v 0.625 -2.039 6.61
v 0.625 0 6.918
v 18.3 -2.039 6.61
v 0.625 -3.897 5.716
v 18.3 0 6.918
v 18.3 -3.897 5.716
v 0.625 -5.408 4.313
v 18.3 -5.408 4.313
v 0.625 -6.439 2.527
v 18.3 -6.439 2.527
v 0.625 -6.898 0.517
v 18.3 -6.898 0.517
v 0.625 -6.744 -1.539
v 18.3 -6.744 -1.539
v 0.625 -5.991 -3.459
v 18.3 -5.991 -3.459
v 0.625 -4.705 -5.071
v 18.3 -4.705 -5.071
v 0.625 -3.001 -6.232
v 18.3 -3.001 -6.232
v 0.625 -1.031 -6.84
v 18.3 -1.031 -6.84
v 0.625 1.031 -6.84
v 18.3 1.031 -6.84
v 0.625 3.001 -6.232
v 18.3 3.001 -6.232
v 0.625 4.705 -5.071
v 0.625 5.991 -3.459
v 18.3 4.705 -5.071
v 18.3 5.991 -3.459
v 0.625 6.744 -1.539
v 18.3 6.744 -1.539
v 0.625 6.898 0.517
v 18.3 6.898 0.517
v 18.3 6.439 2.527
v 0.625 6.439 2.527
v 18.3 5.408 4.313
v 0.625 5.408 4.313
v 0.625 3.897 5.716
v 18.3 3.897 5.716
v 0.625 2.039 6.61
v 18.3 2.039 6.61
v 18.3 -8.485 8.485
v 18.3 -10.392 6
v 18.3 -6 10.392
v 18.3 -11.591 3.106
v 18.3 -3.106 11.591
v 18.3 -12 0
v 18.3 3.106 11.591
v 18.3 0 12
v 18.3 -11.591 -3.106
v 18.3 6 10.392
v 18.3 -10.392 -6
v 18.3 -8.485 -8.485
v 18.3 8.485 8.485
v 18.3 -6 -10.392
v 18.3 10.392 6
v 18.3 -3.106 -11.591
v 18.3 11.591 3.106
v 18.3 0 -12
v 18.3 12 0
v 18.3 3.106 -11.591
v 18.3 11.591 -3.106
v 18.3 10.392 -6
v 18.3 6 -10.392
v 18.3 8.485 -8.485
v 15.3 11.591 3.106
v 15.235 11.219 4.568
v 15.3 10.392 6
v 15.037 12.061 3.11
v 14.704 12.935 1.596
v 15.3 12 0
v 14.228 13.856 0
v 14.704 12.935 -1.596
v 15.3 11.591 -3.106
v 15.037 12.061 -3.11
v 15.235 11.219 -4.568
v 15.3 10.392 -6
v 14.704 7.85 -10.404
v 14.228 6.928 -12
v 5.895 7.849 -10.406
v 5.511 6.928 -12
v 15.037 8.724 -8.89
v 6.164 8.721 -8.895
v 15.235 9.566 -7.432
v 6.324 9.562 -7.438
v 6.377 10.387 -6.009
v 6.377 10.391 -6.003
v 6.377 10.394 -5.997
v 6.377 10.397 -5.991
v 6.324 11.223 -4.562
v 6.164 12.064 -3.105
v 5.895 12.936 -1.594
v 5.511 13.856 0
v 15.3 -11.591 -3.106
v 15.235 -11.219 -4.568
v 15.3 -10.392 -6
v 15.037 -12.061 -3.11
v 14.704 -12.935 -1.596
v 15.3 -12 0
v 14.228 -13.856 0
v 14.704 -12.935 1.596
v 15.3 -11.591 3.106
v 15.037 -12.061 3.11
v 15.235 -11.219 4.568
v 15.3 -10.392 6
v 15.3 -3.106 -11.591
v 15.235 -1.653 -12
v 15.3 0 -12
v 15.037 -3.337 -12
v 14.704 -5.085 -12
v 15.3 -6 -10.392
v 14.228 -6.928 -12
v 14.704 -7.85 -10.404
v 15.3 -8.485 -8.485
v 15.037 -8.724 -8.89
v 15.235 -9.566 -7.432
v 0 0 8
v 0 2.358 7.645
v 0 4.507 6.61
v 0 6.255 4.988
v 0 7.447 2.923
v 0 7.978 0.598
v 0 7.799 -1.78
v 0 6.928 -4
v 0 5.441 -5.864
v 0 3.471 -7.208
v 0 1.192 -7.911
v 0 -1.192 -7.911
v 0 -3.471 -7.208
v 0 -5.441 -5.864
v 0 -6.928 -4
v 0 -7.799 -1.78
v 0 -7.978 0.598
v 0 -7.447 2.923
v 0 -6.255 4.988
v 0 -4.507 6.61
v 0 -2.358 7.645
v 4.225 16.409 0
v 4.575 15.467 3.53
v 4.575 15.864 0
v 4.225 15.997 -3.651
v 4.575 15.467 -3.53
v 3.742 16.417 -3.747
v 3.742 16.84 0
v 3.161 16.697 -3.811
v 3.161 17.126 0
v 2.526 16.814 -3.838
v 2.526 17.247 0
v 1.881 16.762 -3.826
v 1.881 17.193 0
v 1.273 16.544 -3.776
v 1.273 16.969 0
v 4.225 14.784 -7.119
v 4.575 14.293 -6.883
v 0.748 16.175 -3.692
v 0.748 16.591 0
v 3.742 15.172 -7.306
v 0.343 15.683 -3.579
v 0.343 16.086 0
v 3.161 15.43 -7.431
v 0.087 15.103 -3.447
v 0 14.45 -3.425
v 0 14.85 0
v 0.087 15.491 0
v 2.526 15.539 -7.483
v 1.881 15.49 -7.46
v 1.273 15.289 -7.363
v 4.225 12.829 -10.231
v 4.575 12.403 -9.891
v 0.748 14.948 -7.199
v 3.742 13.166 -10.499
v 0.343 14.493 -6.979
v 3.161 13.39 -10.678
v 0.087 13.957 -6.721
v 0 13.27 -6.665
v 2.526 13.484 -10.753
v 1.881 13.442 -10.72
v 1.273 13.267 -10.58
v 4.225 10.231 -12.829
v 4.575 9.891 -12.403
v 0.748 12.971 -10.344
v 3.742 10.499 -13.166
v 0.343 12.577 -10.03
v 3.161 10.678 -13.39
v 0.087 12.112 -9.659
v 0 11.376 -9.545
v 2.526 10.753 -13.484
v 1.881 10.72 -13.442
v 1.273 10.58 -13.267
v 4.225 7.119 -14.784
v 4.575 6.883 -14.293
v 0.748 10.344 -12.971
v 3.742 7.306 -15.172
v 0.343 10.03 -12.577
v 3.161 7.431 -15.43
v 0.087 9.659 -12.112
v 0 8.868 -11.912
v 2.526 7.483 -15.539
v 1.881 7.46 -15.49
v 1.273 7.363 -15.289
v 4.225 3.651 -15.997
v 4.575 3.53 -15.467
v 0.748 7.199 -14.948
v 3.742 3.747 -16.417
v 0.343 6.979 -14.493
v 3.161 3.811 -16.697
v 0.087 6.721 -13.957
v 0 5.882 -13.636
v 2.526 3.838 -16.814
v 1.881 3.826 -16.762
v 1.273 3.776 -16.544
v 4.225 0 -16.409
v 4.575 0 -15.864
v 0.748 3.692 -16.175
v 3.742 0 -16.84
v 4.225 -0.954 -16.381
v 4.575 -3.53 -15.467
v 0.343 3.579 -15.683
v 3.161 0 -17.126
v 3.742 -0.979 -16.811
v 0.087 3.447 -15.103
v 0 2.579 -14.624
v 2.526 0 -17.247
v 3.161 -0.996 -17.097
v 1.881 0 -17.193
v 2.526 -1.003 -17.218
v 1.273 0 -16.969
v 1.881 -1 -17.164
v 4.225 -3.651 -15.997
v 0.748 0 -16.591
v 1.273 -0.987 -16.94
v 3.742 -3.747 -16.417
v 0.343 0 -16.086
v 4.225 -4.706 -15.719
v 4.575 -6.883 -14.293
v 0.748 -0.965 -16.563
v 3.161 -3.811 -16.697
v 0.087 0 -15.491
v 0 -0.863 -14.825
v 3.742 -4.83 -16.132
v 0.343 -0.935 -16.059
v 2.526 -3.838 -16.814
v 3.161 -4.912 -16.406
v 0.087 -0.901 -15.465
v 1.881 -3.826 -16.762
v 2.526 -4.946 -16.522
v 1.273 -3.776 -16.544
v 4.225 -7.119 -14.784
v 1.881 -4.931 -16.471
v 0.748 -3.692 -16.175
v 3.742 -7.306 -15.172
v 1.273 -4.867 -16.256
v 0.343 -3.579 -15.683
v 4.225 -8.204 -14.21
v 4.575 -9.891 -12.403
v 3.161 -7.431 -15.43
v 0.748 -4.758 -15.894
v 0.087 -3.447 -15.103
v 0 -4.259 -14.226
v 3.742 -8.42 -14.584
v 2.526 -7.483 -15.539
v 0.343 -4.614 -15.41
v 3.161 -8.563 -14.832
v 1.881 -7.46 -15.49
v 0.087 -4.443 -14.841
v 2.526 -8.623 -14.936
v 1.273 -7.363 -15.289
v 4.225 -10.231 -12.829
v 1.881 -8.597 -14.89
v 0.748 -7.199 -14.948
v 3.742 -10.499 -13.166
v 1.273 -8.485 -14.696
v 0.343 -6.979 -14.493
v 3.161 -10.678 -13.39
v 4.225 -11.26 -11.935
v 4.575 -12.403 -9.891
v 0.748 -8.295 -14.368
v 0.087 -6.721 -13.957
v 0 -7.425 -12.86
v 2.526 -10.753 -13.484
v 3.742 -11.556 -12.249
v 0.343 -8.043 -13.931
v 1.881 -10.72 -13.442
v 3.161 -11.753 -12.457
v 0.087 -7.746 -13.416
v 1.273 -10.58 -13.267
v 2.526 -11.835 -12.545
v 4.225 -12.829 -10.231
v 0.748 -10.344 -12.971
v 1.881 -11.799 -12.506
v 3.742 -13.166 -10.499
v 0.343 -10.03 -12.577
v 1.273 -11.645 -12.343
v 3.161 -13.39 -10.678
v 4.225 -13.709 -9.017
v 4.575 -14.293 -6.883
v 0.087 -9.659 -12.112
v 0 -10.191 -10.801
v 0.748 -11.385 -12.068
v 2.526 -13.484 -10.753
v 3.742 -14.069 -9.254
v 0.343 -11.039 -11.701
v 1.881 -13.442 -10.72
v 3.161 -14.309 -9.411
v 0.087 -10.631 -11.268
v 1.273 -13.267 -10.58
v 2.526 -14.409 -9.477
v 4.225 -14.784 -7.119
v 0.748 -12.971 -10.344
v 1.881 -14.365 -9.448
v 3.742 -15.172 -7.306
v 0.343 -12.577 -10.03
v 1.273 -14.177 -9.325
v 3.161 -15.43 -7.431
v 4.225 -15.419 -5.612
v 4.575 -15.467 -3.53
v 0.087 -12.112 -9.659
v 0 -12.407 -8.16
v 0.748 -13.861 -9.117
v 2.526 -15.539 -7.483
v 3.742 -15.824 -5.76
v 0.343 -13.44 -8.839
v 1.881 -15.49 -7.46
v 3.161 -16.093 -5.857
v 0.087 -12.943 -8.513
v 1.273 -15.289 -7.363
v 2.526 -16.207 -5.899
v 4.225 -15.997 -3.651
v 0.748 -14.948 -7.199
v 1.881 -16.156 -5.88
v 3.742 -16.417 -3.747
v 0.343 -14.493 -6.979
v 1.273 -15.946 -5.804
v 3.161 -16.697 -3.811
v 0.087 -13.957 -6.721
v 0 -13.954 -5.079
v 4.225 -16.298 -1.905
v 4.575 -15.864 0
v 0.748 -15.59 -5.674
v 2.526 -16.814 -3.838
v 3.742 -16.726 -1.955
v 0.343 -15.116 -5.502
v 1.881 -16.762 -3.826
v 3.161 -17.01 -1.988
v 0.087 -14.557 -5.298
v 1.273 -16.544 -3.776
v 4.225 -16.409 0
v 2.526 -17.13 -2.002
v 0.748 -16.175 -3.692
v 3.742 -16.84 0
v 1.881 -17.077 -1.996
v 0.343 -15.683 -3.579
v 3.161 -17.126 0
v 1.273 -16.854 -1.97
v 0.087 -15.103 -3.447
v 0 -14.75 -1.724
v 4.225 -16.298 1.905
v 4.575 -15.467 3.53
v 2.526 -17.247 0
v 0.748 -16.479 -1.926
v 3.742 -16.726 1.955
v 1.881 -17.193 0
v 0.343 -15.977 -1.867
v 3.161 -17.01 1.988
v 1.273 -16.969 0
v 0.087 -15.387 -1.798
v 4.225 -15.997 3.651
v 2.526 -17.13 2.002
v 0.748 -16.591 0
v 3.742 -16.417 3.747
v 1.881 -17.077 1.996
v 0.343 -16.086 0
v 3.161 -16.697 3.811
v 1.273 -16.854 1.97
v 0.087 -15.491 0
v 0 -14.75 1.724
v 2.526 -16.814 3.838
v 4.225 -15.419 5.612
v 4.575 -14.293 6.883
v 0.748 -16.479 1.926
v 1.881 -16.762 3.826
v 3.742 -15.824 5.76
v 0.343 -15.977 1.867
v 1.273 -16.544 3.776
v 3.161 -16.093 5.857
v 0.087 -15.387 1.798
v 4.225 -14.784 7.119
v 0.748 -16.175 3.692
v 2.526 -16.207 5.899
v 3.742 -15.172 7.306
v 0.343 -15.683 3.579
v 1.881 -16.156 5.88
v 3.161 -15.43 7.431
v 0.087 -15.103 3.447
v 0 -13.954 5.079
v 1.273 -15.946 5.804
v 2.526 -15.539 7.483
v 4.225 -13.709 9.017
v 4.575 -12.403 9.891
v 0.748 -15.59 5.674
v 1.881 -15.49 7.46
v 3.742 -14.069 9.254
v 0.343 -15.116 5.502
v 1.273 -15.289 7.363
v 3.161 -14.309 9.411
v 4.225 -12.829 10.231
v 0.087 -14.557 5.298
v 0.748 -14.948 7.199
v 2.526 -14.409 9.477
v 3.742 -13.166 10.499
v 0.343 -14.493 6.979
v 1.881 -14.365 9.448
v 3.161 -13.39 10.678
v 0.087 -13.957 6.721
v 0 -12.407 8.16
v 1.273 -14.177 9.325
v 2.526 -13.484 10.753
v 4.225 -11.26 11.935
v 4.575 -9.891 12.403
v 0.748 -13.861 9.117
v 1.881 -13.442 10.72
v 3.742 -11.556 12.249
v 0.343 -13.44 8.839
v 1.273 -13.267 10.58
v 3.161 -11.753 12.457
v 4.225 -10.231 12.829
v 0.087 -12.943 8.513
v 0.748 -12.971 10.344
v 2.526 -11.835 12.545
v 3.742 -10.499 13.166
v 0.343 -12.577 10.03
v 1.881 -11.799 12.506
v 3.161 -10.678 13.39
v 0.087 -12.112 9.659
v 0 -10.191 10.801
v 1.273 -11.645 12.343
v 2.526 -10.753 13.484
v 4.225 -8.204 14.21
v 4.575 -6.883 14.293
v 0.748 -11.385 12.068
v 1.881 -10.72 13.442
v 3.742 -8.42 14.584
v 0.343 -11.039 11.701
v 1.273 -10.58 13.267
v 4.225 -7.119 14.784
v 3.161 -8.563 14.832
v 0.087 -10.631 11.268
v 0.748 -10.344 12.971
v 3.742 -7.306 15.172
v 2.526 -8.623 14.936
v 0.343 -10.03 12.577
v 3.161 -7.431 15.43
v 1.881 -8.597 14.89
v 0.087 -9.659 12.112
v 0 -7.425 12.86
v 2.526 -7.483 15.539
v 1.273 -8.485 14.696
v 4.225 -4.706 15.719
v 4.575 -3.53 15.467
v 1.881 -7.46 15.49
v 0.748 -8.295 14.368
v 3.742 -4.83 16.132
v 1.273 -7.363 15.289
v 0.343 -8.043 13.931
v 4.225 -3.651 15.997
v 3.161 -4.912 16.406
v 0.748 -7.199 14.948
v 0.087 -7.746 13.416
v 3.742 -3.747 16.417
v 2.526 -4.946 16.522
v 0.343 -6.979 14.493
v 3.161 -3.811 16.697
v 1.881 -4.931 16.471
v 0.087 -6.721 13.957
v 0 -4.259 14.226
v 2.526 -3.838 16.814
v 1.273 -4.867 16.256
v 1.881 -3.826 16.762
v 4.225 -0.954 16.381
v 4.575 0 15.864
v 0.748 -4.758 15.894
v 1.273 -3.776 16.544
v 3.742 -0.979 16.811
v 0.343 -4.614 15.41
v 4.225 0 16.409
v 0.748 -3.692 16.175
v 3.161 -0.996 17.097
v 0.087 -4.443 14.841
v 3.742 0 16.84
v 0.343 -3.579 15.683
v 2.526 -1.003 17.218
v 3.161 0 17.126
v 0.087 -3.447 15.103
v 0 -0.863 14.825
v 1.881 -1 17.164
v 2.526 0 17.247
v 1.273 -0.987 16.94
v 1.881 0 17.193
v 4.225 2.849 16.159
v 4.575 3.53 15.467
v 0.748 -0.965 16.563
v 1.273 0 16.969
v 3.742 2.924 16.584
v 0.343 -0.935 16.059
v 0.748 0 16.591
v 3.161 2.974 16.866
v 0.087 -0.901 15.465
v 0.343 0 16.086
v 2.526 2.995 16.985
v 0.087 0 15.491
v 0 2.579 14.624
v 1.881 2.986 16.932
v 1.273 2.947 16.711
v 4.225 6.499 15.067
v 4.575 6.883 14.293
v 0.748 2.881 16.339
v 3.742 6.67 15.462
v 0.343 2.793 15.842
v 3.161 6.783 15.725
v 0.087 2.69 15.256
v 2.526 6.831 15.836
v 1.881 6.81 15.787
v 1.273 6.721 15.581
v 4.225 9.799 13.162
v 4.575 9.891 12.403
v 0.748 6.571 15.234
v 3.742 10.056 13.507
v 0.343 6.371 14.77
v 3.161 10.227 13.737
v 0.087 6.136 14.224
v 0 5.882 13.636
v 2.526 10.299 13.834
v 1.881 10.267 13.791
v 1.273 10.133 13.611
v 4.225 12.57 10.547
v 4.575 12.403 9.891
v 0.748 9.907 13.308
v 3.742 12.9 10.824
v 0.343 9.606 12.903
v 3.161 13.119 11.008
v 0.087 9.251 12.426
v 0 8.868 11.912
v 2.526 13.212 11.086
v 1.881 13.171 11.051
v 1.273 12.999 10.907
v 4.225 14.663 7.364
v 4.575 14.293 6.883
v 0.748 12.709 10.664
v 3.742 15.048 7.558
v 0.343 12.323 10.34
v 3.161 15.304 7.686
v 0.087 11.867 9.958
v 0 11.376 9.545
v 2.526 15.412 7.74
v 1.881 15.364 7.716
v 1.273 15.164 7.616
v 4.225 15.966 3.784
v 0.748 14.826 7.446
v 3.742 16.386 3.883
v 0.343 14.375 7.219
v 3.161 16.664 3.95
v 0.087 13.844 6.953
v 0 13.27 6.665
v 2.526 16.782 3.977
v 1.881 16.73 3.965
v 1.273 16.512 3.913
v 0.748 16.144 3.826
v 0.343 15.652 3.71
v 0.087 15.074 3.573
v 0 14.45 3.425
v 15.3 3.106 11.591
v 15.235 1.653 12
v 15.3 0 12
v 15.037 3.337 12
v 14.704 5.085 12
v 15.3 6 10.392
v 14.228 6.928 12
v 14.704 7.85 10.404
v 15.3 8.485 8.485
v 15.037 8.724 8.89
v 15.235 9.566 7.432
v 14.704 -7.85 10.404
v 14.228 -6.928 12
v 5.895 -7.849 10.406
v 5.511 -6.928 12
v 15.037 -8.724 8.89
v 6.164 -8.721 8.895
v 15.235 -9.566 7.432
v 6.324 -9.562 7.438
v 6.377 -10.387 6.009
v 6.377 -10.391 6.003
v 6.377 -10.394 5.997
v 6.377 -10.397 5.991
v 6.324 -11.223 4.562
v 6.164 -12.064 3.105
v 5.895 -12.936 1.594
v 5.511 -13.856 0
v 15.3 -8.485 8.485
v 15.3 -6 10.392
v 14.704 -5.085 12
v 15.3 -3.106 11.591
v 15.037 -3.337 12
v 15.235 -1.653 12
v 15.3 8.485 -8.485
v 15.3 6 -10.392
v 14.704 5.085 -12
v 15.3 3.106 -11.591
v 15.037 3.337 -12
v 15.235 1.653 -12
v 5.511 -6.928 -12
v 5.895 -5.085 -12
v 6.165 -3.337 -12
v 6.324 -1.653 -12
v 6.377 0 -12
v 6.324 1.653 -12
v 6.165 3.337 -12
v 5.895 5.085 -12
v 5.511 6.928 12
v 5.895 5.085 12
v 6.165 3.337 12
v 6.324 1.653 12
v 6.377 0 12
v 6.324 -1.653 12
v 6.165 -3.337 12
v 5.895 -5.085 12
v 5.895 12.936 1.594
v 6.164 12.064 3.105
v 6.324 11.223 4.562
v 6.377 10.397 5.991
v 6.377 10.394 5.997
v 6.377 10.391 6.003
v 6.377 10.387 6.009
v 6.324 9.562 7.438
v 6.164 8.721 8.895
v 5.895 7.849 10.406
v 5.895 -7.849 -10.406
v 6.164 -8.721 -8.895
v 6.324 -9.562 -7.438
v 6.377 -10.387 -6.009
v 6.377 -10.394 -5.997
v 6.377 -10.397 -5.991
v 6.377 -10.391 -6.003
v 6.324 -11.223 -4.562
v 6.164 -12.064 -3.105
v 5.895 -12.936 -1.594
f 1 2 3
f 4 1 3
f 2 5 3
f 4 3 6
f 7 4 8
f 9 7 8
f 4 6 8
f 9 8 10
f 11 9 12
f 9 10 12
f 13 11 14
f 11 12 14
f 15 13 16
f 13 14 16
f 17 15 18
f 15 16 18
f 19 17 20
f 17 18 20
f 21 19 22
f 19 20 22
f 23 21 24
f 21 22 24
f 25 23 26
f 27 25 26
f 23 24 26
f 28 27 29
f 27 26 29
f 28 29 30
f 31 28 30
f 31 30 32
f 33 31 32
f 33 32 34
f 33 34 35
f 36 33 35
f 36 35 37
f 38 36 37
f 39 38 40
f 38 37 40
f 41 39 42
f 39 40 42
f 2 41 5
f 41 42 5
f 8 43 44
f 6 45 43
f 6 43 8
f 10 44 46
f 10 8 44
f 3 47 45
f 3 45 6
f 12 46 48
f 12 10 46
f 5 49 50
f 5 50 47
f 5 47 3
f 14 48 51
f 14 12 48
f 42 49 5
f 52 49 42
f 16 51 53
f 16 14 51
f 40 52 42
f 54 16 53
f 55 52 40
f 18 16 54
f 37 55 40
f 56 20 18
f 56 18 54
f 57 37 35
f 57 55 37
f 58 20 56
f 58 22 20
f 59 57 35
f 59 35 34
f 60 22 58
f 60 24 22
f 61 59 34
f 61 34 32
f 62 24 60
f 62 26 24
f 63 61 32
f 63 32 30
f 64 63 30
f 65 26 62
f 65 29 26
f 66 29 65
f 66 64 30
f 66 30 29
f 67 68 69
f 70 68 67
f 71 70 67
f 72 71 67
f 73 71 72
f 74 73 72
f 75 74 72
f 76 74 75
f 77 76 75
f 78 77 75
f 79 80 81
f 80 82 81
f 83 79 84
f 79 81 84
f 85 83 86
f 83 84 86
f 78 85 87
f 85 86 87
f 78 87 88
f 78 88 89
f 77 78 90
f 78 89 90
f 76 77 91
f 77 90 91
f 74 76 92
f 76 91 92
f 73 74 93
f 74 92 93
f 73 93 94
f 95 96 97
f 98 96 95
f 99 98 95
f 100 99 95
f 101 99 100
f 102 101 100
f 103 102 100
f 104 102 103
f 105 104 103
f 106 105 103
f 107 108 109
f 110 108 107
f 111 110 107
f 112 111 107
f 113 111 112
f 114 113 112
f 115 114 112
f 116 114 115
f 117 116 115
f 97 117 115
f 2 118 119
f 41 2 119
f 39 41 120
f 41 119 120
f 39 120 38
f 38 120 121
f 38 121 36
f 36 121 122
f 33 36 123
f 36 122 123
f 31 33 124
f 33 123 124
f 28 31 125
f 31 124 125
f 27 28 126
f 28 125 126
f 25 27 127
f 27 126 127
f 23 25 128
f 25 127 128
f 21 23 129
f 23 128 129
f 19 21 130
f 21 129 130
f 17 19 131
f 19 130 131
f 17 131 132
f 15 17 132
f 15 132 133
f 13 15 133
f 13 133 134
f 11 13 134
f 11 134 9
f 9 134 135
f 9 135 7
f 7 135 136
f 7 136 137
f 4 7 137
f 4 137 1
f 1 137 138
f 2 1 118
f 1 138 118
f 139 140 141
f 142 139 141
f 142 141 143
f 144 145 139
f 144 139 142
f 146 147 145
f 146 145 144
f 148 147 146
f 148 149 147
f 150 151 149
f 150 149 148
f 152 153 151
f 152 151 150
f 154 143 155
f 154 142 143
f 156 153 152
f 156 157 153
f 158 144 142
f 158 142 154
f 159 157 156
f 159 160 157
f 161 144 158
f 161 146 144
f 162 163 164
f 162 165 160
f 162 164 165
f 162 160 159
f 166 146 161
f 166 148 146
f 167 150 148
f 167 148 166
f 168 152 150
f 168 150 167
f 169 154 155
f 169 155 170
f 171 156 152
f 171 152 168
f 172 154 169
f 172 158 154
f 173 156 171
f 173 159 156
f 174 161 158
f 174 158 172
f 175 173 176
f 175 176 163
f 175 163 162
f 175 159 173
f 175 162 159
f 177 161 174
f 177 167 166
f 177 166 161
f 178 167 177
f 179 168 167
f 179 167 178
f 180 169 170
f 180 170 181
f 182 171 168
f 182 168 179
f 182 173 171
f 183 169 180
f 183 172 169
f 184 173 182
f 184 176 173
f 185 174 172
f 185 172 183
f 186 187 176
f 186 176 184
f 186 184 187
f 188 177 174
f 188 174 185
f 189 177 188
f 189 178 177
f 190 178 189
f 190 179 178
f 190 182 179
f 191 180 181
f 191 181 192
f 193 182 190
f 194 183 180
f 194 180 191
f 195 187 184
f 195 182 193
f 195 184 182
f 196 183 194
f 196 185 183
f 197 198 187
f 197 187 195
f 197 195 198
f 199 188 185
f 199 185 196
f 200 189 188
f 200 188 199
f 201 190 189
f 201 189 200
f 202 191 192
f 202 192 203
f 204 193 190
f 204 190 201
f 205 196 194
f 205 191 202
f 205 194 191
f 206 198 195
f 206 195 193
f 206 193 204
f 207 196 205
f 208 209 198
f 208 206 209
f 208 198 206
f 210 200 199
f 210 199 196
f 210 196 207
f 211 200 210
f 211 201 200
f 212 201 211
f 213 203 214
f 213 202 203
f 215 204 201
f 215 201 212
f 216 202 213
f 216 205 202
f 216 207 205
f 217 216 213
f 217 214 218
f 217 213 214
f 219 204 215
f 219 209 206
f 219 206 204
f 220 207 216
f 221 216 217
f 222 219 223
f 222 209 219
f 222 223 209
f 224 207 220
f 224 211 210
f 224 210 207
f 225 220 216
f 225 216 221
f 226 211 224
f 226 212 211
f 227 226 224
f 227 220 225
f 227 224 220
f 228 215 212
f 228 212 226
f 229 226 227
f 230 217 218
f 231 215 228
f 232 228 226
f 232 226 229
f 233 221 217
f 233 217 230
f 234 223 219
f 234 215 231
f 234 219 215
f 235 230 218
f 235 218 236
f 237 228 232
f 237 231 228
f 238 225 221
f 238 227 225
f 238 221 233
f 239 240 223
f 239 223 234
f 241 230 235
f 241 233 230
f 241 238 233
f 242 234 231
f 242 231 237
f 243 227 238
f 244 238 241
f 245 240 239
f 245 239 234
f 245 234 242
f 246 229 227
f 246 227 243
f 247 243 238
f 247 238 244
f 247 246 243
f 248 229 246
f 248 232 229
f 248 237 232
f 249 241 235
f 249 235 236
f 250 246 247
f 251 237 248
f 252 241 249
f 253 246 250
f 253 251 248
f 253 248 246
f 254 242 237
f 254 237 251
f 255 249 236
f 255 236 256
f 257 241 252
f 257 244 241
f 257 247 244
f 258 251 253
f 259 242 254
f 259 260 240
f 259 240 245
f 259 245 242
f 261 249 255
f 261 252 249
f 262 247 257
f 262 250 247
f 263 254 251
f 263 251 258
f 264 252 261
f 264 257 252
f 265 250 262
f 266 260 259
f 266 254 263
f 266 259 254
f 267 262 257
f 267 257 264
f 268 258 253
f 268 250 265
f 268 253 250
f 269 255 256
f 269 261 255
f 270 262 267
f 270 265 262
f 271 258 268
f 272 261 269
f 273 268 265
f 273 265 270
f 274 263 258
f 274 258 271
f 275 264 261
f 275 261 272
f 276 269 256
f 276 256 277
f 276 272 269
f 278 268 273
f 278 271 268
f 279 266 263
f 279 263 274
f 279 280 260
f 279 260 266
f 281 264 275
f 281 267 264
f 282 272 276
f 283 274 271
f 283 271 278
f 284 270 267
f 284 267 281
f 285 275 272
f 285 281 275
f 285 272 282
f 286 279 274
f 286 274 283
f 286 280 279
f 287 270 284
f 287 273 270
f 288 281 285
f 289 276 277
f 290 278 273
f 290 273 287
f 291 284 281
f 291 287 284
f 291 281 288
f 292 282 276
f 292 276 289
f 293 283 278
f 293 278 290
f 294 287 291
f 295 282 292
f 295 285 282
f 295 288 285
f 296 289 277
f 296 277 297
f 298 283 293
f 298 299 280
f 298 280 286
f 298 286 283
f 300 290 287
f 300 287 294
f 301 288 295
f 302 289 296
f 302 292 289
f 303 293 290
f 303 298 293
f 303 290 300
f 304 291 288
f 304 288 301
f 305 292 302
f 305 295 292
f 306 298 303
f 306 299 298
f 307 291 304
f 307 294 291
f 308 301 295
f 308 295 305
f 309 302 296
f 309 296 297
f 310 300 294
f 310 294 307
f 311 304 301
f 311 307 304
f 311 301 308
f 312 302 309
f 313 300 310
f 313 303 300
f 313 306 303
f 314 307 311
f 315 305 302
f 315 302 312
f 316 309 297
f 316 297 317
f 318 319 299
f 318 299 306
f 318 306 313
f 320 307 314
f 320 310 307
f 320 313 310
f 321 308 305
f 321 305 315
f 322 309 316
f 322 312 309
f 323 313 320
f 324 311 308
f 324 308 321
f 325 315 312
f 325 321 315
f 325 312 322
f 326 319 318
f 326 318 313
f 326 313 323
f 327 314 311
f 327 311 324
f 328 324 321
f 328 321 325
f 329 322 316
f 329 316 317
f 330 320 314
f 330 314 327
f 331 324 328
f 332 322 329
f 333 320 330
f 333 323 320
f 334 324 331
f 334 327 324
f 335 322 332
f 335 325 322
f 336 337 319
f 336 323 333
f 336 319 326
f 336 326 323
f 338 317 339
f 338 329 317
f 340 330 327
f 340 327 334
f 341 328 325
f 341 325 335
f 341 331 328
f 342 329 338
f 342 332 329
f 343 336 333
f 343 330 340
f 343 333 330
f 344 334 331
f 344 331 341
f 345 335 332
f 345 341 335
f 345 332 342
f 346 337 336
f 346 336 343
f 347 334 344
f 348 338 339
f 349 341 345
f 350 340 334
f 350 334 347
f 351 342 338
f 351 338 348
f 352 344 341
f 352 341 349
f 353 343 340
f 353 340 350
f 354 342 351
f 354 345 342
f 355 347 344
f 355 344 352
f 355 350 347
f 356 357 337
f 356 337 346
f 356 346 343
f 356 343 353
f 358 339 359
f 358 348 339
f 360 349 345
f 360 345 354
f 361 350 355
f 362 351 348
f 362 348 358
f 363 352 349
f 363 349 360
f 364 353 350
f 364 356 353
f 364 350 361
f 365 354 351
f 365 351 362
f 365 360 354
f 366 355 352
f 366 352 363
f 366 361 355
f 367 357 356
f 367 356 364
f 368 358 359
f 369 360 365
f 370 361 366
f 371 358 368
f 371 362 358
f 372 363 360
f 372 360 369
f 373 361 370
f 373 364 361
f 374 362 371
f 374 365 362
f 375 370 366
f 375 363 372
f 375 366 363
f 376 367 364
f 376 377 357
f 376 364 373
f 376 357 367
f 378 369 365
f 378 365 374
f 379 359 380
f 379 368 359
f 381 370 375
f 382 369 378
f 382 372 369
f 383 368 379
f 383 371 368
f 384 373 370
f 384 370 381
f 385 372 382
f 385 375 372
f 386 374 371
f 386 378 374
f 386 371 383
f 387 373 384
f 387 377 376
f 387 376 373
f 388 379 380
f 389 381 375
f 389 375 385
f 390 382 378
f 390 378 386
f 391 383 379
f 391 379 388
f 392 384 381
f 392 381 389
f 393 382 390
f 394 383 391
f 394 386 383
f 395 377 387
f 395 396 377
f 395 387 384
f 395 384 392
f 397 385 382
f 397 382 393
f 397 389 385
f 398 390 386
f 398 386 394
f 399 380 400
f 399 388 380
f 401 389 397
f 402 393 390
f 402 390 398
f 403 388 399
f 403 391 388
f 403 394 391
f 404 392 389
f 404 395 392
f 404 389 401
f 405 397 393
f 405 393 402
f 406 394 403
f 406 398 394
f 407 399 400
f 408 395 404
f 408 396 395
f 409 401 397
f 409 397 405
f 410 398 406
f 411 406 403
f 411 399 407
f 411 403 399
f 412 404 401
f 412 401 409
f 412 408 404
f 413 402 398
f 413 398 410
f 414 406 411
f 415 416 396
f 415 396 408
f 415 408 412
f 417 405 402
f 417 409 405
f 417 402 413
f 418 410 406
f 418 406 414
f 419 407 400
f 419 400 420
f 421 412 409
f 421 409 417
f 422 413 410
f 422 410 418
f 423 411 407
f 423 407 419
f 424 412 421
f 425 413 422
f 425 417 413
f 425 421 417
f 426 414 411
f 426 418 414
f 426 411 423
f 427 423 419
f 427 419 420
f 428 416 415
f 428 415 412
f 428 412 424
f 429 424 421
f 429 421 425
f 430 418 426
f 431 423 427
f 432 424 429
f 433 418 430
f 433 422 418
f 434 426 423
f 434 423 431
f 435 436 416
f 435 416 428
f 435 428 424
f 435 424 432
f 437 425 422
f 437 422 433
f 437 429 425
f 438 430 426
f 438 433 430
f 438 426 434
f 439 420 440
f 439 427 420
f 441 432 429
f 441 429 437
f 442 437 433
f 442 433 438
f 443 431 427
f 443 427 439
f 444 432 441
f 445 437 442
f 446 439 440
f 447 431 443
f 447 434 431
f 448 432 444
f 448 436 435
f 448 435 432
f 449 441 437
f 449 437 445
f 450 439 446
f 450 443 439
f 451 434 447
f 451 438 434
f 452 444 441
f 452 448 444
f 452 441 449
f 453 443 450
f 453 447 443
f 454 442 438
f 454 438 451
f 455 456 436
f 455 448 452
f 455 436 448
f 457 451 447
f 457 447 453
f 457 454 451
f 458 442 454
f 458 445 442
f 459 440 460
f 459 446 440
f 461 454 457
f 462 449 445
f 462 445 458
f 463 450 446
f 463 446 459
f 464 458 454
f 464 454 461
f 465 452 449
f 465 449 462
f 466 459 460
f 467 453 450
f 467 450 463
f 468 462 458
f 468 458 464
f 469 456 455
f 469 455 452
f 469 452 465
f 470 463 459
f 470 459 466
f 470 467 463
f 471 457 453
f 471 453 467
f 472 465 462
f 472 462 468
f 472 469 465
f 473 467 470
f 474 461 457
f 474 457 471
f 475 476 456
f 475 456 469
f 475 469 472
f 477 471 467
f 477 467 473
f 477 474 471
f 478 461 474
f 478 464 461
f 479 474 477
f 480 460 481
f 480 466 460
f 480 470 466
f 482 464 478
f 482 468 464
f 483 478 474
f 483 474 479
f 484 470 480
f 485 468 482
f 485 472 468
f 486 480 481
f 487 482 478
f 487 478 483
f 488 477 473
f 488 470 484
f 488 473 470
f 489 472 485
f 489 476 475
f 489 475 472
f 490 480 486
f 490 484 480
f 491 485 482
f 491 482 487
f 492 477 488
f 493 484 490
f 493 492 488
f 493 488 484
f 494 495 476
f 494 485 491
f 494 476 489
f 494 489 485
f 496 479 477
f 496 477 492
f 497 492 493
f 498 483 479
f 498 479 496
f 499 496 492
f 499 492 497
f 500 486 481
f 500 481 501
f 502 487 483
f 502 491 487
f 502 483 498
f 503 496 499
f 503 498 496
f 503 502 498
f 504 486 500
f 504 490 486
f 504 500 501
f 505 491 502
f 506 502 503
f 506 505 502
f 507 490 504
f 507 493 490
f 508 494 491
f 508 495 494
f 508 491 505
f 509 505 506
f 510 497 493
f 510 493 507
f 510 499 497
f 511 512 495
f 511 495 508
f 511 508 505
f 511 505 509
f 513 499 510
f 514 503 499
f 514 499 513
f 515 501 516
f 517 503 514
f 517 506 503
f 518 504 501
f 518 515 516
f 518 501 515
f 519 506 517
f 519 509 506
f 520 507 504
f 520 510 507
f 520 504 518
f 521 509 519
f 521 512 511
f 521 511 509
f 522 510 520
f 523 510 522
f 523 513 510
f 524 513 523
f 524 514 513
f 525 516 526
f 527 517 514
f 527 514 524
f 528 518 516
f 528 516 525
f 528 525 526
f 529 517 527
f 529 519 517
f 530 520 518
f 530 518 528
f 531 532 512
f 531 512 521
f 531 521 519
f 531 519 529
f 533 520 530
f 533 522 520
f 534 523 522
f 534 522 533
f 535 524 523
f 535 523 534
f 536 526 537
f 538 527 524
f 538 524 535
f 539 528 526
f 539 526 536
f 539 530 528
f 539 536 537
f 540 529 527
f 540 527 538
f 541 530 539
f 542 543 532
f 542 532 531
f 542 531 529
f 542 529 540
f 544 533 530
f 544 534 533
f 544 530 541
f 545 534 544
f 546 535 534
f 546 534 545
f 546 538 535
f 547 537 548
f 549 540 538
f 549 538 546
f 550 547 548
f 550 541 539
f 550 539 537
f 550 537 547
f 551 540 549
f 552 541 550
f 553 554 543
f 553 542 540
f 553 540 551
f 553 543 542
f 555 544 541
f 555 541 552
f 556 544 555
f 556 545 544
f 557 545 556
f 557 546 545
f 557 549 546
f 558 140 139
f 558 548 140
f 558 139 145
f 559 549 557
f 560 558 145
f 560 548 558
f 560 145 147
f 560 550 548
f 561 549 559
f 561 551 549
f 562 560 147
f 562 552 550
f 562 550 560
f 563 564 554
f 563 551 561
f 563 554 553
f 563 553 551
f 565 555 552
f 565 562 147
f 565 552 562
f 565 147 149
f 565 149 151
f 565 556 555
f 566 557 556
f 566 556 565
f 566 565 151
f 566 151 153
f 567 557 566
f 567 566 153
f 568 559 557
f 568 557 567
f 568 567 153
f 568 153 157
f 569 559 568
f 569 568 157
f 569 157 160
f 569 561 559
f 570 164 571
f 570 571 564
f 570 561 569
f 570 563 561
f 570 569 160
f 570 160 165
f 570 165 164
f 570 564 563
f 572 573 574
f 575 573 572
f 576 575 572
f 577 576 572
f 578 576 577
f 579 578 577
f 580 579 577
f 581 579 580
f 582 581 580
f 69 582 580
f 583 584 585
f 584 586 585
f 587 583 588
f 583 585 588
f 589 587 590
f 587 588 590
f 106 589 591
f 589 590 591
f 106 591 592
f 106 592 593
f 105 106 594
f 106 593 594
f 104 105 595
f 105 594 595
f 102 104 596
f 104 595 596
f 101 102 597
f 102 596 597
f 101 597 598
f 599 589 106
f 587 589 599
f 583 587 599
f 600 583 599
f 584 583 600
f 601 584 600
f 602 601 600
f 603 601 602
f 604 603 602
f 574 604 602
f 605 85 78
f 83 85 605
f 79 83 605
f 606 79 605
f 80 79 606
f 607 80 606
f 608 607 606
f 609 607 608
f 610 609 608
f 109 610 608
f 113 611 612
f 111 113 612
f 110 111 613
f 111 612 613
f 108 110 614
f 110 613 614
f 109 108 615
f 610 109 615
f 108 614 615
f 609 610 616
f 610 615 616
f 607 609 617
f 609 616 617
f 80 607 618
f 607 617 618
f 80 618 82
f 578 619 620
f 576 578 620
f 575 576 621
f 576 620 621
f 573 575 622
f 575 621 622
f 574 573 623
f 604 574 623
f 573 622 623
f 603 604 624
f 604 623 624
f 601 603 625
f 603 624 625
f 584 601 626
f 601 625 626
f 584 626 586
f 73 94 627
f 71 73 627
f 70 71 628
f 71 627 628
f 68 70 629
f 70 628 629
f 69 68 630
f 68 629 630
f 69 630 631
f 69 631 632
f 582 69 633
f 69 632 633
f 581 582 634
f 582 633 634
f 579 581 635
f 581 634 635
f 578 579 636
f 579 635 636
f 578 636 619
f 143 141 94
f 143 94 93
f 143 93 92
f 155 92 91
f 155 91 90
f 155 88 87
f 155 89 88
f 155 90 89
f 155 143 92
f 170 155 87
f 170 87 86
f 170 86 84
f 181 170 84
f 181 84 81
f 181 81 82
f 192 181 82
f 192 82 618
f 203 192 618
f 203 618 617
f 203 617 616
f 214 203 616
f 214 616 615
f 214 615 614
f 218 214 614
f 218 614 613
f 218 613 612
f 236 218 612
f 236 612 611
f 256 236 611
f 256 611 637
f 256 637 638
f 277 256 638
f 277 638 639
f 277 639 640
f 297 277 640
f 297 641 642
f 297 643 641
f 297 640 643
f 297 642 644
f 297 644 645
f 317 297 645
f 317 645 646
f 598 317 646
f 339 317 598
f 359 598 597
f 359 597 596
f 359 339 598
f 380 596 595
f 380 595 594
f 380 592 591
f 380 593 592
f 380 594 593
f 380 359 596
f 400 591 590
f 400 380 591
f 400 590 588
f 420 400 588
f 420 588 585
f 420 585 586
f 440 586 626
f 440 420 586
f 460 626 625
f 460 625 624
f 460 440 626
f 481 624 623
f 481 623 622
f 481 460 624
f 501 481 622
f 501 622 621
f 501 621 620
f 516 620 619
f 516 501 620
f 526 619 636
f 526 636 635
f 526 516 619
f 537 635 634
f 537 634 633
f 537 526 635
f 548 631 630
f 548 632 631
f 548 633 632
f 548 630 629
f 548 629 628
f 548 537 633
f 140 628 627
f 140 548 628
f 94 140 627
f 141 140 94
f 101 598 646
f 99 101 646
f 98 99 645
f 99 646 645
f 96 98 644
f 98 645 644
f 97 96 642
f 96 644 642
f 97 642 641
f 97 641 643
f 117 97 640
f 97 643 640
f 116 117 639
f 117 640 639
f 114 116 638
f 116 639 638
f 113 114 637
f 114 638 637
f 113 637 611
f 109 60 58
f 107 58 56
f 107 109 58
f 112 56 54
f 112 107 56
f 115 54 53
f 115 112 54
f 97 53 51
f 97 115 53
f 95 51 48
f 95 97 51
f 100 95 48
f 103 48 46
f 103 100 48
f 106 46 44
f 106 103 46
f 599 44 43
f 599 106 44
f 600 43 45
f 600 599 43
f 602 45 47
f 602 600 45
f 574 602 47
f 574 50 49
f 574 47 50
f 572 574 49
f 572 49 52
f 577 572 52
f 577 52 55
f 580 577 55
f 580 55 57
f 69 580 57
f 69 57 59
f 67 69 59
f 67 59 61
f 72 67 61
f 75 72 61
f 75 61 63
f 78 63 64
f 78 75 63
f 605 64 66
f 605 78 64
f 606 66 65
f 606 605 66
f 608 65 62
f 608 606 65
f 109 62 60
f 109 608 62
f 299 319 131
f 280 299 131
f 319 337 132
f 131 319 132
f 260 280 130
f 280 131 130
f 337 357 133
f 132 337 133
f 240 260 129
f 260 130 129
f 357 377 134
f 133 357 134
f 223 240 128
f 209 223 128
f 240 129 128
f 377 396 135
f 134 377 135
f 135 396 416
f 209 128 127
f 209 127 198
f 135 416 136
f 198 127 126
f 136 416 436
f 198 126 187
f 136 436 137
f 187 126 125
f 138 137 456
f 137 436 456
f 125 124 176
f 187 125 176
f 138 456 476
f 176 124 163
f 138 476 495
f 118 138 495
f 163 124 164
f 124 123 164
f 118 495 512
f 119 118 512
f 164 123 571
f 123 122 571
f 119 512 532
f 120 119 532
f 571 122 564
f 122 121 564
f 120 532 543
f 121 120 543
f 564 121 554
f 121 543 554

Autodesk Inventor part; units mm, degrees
ref_plane "YZ Plane" through (0, 0, 0) normal (1, 0, 0) x (0, 1, 0)
ref_plane "XZ Plane" through (0, 0, 0) normal (0, 1, 0) x (-1, 0, 0)
sketch "Schizzo1" plane through (0, 0, 0) normal (0, 0, 1) x (1, 0, 0)
  line L0 (-4.1484, 0) -> (22.0414, 0) projected
  line L1 (6.3771, 12) -> (4.5751, 15.8643)
  line L2 (6.3771, 12) -> (18.3, 12) construction
  line L3 (18.3, 12) -> (18.3, 0) construction
  arc A0 (4.5751, 15.8643) -> (0, 14.85) centre (2.4, 14.85) ccw
  line L4 (6.3771, 12) -> (6.3771, 0)
  line L5 (0, -3.5401) -> (0, 21.2403) projected
  point P0 (0, 0)
  dimension "d1" = 24
  dimension "d3" = 34.5
  dimension "d4" = 2.4
  dimension "d16" = 18.3
  dimension "d17" = 25
revolve "Anello" add sketch "Schizzo1" angle 360 about axis through (-10, 0, 0) along (1, 0, 0)
sketch "Schizzo2" plane through (0, 0, 0) normal (-1, 0, 0) x (0, 0, 1)
  circle A0 centre (0, 0) radius 4.9
  line L0 (-12, -6.9282) -> (-12, 6.9282)
  line L1 (-12, 6.9282) -> (0, 13.8564)
  line L2 (0, 13.8564) -> (12, 6.9282)
  line L3 (12, 6.9282) -> (12, -6.9282)
  line L4 (12, -6.9282) -> (0, -13.8564)
  line L5 (0, -13.8564) -> (-12, -6.9282)
  circle A1 centre (0, 0) radius 14.85 projected
  dimension "d5" = 27.7128
extrude "Corpo" add sketch "Schizzo2" against normal blind 15.3 contours A0 | L0 L1 L2 L3 L4 L5
sketch "Schizzo3" plane through (15.3, 0, 0) normal (1, 0, 0) x (0, 0, -1)
  circle A0 centre (0, 0) radius 12
  dimension "d19" = 24
extrude "Corona" add sketch "Schizzo3" along normal blind 3
sketch "Schizzo4" plane through (0, 0, 0) normal (-1, 0, 0) x (0, 0, 1)
  circle A0 centre (0, 0) radius 4.9
  circle A1 centre (0, 0) radius 14.85 projected
hole "Filettatura" at (0, 0, 0) direction (1, 0, 0) diameter 13.835 end through all thread size "M16x2" class "6H" standard "ISO Metric profile"
sketch "Schizzo5" plane through (0, 0, 0) normal (0, 0, 1) x (1, 0, 0)
  line L0 (5.5114, 13.8564) -> (15.3, 13.8564) projected
  line L1 (15.3, 6.9282) -> (15.3, 13.8564) projected
  line L2 (0, -14.85) -> (0, 14.85) projected
  line L3 (-3.06, 0) -> (18.36, 0) projected
  line L4 (14.2282, 13.8564) -> (15.3, 12)
  dimension "d9" = 30
  dimension "d10" = 24
revolve "Smusso1" cut sketch "Schizzo5" angle 360 about axis through (-10, 0, 0) along (1, 0, 0)
chamfer "Smusso2" distance 1.0825 angle 30 1 edges at (0, 0, -6.9175) measured on face at (0, 12.0452, -1.4626)
ref_plane "Work Plane1" through (52.1094, 0, 0) normal (0, 0, -1) x (-1, 0, 0)
equation "\"d1\" = SW"
equation "\"d3\" = LADI"
equation "\"d4\" = PHH"
equation "\"d16\" = KOH"
equation "\"d17\" = KEWI"
equation "\"d5\" = 1.1547 * SW"
equation "\"d6\" = KOH1"
equation "\"d19\" = SD2"
equation "\"d11\" = KOH - KOH1"
equation "\"d9\" = ANG1"
equation "\"d10\" = SW0"
equation "\"d13\" = -0.5 * GD1 + 0.5 * NND"
equation "\"d57\" = -0.5 * GD1 + 0.5 * NND"
equation "\"ANG1\" = 30deg"
equation "\"KEWI\" = 25deg"
equation "\"NND\" = 16"
equation "\"LADI\" = 34.5"
equation "\"SW\" = 24"
equation "\"PHH\" = 2.4"
equation "\"KOH\" = 18.3"
equation "\"SW0\" = SW"
equation "\"d0\" = LADI"
equation "\"d2\" = PHH"
equation "\"KOH1\" = 15.3"
equation "\"SD2\" = SW"
equation "\"GUL\" = 0.541266 * PTC"
equation "\"RR\" = PHH"
equation "\"THREADDIA\" = 16"
equation "\"TOA\" = 30deg"
equation "\"PTC\" = 2"
equation "\"GAL\" = 0.541266 * PTC"
equation "\"E0\" = 1.155 * SW"
equation "\"PG\" = 1.2345"
equation "\"Mw\" = 8.9"
equation "\"r\" = 1"
equation "\"GD1\" = 13.834936"
properties part number "ISO 7044 - M16" material "Acciaio"
